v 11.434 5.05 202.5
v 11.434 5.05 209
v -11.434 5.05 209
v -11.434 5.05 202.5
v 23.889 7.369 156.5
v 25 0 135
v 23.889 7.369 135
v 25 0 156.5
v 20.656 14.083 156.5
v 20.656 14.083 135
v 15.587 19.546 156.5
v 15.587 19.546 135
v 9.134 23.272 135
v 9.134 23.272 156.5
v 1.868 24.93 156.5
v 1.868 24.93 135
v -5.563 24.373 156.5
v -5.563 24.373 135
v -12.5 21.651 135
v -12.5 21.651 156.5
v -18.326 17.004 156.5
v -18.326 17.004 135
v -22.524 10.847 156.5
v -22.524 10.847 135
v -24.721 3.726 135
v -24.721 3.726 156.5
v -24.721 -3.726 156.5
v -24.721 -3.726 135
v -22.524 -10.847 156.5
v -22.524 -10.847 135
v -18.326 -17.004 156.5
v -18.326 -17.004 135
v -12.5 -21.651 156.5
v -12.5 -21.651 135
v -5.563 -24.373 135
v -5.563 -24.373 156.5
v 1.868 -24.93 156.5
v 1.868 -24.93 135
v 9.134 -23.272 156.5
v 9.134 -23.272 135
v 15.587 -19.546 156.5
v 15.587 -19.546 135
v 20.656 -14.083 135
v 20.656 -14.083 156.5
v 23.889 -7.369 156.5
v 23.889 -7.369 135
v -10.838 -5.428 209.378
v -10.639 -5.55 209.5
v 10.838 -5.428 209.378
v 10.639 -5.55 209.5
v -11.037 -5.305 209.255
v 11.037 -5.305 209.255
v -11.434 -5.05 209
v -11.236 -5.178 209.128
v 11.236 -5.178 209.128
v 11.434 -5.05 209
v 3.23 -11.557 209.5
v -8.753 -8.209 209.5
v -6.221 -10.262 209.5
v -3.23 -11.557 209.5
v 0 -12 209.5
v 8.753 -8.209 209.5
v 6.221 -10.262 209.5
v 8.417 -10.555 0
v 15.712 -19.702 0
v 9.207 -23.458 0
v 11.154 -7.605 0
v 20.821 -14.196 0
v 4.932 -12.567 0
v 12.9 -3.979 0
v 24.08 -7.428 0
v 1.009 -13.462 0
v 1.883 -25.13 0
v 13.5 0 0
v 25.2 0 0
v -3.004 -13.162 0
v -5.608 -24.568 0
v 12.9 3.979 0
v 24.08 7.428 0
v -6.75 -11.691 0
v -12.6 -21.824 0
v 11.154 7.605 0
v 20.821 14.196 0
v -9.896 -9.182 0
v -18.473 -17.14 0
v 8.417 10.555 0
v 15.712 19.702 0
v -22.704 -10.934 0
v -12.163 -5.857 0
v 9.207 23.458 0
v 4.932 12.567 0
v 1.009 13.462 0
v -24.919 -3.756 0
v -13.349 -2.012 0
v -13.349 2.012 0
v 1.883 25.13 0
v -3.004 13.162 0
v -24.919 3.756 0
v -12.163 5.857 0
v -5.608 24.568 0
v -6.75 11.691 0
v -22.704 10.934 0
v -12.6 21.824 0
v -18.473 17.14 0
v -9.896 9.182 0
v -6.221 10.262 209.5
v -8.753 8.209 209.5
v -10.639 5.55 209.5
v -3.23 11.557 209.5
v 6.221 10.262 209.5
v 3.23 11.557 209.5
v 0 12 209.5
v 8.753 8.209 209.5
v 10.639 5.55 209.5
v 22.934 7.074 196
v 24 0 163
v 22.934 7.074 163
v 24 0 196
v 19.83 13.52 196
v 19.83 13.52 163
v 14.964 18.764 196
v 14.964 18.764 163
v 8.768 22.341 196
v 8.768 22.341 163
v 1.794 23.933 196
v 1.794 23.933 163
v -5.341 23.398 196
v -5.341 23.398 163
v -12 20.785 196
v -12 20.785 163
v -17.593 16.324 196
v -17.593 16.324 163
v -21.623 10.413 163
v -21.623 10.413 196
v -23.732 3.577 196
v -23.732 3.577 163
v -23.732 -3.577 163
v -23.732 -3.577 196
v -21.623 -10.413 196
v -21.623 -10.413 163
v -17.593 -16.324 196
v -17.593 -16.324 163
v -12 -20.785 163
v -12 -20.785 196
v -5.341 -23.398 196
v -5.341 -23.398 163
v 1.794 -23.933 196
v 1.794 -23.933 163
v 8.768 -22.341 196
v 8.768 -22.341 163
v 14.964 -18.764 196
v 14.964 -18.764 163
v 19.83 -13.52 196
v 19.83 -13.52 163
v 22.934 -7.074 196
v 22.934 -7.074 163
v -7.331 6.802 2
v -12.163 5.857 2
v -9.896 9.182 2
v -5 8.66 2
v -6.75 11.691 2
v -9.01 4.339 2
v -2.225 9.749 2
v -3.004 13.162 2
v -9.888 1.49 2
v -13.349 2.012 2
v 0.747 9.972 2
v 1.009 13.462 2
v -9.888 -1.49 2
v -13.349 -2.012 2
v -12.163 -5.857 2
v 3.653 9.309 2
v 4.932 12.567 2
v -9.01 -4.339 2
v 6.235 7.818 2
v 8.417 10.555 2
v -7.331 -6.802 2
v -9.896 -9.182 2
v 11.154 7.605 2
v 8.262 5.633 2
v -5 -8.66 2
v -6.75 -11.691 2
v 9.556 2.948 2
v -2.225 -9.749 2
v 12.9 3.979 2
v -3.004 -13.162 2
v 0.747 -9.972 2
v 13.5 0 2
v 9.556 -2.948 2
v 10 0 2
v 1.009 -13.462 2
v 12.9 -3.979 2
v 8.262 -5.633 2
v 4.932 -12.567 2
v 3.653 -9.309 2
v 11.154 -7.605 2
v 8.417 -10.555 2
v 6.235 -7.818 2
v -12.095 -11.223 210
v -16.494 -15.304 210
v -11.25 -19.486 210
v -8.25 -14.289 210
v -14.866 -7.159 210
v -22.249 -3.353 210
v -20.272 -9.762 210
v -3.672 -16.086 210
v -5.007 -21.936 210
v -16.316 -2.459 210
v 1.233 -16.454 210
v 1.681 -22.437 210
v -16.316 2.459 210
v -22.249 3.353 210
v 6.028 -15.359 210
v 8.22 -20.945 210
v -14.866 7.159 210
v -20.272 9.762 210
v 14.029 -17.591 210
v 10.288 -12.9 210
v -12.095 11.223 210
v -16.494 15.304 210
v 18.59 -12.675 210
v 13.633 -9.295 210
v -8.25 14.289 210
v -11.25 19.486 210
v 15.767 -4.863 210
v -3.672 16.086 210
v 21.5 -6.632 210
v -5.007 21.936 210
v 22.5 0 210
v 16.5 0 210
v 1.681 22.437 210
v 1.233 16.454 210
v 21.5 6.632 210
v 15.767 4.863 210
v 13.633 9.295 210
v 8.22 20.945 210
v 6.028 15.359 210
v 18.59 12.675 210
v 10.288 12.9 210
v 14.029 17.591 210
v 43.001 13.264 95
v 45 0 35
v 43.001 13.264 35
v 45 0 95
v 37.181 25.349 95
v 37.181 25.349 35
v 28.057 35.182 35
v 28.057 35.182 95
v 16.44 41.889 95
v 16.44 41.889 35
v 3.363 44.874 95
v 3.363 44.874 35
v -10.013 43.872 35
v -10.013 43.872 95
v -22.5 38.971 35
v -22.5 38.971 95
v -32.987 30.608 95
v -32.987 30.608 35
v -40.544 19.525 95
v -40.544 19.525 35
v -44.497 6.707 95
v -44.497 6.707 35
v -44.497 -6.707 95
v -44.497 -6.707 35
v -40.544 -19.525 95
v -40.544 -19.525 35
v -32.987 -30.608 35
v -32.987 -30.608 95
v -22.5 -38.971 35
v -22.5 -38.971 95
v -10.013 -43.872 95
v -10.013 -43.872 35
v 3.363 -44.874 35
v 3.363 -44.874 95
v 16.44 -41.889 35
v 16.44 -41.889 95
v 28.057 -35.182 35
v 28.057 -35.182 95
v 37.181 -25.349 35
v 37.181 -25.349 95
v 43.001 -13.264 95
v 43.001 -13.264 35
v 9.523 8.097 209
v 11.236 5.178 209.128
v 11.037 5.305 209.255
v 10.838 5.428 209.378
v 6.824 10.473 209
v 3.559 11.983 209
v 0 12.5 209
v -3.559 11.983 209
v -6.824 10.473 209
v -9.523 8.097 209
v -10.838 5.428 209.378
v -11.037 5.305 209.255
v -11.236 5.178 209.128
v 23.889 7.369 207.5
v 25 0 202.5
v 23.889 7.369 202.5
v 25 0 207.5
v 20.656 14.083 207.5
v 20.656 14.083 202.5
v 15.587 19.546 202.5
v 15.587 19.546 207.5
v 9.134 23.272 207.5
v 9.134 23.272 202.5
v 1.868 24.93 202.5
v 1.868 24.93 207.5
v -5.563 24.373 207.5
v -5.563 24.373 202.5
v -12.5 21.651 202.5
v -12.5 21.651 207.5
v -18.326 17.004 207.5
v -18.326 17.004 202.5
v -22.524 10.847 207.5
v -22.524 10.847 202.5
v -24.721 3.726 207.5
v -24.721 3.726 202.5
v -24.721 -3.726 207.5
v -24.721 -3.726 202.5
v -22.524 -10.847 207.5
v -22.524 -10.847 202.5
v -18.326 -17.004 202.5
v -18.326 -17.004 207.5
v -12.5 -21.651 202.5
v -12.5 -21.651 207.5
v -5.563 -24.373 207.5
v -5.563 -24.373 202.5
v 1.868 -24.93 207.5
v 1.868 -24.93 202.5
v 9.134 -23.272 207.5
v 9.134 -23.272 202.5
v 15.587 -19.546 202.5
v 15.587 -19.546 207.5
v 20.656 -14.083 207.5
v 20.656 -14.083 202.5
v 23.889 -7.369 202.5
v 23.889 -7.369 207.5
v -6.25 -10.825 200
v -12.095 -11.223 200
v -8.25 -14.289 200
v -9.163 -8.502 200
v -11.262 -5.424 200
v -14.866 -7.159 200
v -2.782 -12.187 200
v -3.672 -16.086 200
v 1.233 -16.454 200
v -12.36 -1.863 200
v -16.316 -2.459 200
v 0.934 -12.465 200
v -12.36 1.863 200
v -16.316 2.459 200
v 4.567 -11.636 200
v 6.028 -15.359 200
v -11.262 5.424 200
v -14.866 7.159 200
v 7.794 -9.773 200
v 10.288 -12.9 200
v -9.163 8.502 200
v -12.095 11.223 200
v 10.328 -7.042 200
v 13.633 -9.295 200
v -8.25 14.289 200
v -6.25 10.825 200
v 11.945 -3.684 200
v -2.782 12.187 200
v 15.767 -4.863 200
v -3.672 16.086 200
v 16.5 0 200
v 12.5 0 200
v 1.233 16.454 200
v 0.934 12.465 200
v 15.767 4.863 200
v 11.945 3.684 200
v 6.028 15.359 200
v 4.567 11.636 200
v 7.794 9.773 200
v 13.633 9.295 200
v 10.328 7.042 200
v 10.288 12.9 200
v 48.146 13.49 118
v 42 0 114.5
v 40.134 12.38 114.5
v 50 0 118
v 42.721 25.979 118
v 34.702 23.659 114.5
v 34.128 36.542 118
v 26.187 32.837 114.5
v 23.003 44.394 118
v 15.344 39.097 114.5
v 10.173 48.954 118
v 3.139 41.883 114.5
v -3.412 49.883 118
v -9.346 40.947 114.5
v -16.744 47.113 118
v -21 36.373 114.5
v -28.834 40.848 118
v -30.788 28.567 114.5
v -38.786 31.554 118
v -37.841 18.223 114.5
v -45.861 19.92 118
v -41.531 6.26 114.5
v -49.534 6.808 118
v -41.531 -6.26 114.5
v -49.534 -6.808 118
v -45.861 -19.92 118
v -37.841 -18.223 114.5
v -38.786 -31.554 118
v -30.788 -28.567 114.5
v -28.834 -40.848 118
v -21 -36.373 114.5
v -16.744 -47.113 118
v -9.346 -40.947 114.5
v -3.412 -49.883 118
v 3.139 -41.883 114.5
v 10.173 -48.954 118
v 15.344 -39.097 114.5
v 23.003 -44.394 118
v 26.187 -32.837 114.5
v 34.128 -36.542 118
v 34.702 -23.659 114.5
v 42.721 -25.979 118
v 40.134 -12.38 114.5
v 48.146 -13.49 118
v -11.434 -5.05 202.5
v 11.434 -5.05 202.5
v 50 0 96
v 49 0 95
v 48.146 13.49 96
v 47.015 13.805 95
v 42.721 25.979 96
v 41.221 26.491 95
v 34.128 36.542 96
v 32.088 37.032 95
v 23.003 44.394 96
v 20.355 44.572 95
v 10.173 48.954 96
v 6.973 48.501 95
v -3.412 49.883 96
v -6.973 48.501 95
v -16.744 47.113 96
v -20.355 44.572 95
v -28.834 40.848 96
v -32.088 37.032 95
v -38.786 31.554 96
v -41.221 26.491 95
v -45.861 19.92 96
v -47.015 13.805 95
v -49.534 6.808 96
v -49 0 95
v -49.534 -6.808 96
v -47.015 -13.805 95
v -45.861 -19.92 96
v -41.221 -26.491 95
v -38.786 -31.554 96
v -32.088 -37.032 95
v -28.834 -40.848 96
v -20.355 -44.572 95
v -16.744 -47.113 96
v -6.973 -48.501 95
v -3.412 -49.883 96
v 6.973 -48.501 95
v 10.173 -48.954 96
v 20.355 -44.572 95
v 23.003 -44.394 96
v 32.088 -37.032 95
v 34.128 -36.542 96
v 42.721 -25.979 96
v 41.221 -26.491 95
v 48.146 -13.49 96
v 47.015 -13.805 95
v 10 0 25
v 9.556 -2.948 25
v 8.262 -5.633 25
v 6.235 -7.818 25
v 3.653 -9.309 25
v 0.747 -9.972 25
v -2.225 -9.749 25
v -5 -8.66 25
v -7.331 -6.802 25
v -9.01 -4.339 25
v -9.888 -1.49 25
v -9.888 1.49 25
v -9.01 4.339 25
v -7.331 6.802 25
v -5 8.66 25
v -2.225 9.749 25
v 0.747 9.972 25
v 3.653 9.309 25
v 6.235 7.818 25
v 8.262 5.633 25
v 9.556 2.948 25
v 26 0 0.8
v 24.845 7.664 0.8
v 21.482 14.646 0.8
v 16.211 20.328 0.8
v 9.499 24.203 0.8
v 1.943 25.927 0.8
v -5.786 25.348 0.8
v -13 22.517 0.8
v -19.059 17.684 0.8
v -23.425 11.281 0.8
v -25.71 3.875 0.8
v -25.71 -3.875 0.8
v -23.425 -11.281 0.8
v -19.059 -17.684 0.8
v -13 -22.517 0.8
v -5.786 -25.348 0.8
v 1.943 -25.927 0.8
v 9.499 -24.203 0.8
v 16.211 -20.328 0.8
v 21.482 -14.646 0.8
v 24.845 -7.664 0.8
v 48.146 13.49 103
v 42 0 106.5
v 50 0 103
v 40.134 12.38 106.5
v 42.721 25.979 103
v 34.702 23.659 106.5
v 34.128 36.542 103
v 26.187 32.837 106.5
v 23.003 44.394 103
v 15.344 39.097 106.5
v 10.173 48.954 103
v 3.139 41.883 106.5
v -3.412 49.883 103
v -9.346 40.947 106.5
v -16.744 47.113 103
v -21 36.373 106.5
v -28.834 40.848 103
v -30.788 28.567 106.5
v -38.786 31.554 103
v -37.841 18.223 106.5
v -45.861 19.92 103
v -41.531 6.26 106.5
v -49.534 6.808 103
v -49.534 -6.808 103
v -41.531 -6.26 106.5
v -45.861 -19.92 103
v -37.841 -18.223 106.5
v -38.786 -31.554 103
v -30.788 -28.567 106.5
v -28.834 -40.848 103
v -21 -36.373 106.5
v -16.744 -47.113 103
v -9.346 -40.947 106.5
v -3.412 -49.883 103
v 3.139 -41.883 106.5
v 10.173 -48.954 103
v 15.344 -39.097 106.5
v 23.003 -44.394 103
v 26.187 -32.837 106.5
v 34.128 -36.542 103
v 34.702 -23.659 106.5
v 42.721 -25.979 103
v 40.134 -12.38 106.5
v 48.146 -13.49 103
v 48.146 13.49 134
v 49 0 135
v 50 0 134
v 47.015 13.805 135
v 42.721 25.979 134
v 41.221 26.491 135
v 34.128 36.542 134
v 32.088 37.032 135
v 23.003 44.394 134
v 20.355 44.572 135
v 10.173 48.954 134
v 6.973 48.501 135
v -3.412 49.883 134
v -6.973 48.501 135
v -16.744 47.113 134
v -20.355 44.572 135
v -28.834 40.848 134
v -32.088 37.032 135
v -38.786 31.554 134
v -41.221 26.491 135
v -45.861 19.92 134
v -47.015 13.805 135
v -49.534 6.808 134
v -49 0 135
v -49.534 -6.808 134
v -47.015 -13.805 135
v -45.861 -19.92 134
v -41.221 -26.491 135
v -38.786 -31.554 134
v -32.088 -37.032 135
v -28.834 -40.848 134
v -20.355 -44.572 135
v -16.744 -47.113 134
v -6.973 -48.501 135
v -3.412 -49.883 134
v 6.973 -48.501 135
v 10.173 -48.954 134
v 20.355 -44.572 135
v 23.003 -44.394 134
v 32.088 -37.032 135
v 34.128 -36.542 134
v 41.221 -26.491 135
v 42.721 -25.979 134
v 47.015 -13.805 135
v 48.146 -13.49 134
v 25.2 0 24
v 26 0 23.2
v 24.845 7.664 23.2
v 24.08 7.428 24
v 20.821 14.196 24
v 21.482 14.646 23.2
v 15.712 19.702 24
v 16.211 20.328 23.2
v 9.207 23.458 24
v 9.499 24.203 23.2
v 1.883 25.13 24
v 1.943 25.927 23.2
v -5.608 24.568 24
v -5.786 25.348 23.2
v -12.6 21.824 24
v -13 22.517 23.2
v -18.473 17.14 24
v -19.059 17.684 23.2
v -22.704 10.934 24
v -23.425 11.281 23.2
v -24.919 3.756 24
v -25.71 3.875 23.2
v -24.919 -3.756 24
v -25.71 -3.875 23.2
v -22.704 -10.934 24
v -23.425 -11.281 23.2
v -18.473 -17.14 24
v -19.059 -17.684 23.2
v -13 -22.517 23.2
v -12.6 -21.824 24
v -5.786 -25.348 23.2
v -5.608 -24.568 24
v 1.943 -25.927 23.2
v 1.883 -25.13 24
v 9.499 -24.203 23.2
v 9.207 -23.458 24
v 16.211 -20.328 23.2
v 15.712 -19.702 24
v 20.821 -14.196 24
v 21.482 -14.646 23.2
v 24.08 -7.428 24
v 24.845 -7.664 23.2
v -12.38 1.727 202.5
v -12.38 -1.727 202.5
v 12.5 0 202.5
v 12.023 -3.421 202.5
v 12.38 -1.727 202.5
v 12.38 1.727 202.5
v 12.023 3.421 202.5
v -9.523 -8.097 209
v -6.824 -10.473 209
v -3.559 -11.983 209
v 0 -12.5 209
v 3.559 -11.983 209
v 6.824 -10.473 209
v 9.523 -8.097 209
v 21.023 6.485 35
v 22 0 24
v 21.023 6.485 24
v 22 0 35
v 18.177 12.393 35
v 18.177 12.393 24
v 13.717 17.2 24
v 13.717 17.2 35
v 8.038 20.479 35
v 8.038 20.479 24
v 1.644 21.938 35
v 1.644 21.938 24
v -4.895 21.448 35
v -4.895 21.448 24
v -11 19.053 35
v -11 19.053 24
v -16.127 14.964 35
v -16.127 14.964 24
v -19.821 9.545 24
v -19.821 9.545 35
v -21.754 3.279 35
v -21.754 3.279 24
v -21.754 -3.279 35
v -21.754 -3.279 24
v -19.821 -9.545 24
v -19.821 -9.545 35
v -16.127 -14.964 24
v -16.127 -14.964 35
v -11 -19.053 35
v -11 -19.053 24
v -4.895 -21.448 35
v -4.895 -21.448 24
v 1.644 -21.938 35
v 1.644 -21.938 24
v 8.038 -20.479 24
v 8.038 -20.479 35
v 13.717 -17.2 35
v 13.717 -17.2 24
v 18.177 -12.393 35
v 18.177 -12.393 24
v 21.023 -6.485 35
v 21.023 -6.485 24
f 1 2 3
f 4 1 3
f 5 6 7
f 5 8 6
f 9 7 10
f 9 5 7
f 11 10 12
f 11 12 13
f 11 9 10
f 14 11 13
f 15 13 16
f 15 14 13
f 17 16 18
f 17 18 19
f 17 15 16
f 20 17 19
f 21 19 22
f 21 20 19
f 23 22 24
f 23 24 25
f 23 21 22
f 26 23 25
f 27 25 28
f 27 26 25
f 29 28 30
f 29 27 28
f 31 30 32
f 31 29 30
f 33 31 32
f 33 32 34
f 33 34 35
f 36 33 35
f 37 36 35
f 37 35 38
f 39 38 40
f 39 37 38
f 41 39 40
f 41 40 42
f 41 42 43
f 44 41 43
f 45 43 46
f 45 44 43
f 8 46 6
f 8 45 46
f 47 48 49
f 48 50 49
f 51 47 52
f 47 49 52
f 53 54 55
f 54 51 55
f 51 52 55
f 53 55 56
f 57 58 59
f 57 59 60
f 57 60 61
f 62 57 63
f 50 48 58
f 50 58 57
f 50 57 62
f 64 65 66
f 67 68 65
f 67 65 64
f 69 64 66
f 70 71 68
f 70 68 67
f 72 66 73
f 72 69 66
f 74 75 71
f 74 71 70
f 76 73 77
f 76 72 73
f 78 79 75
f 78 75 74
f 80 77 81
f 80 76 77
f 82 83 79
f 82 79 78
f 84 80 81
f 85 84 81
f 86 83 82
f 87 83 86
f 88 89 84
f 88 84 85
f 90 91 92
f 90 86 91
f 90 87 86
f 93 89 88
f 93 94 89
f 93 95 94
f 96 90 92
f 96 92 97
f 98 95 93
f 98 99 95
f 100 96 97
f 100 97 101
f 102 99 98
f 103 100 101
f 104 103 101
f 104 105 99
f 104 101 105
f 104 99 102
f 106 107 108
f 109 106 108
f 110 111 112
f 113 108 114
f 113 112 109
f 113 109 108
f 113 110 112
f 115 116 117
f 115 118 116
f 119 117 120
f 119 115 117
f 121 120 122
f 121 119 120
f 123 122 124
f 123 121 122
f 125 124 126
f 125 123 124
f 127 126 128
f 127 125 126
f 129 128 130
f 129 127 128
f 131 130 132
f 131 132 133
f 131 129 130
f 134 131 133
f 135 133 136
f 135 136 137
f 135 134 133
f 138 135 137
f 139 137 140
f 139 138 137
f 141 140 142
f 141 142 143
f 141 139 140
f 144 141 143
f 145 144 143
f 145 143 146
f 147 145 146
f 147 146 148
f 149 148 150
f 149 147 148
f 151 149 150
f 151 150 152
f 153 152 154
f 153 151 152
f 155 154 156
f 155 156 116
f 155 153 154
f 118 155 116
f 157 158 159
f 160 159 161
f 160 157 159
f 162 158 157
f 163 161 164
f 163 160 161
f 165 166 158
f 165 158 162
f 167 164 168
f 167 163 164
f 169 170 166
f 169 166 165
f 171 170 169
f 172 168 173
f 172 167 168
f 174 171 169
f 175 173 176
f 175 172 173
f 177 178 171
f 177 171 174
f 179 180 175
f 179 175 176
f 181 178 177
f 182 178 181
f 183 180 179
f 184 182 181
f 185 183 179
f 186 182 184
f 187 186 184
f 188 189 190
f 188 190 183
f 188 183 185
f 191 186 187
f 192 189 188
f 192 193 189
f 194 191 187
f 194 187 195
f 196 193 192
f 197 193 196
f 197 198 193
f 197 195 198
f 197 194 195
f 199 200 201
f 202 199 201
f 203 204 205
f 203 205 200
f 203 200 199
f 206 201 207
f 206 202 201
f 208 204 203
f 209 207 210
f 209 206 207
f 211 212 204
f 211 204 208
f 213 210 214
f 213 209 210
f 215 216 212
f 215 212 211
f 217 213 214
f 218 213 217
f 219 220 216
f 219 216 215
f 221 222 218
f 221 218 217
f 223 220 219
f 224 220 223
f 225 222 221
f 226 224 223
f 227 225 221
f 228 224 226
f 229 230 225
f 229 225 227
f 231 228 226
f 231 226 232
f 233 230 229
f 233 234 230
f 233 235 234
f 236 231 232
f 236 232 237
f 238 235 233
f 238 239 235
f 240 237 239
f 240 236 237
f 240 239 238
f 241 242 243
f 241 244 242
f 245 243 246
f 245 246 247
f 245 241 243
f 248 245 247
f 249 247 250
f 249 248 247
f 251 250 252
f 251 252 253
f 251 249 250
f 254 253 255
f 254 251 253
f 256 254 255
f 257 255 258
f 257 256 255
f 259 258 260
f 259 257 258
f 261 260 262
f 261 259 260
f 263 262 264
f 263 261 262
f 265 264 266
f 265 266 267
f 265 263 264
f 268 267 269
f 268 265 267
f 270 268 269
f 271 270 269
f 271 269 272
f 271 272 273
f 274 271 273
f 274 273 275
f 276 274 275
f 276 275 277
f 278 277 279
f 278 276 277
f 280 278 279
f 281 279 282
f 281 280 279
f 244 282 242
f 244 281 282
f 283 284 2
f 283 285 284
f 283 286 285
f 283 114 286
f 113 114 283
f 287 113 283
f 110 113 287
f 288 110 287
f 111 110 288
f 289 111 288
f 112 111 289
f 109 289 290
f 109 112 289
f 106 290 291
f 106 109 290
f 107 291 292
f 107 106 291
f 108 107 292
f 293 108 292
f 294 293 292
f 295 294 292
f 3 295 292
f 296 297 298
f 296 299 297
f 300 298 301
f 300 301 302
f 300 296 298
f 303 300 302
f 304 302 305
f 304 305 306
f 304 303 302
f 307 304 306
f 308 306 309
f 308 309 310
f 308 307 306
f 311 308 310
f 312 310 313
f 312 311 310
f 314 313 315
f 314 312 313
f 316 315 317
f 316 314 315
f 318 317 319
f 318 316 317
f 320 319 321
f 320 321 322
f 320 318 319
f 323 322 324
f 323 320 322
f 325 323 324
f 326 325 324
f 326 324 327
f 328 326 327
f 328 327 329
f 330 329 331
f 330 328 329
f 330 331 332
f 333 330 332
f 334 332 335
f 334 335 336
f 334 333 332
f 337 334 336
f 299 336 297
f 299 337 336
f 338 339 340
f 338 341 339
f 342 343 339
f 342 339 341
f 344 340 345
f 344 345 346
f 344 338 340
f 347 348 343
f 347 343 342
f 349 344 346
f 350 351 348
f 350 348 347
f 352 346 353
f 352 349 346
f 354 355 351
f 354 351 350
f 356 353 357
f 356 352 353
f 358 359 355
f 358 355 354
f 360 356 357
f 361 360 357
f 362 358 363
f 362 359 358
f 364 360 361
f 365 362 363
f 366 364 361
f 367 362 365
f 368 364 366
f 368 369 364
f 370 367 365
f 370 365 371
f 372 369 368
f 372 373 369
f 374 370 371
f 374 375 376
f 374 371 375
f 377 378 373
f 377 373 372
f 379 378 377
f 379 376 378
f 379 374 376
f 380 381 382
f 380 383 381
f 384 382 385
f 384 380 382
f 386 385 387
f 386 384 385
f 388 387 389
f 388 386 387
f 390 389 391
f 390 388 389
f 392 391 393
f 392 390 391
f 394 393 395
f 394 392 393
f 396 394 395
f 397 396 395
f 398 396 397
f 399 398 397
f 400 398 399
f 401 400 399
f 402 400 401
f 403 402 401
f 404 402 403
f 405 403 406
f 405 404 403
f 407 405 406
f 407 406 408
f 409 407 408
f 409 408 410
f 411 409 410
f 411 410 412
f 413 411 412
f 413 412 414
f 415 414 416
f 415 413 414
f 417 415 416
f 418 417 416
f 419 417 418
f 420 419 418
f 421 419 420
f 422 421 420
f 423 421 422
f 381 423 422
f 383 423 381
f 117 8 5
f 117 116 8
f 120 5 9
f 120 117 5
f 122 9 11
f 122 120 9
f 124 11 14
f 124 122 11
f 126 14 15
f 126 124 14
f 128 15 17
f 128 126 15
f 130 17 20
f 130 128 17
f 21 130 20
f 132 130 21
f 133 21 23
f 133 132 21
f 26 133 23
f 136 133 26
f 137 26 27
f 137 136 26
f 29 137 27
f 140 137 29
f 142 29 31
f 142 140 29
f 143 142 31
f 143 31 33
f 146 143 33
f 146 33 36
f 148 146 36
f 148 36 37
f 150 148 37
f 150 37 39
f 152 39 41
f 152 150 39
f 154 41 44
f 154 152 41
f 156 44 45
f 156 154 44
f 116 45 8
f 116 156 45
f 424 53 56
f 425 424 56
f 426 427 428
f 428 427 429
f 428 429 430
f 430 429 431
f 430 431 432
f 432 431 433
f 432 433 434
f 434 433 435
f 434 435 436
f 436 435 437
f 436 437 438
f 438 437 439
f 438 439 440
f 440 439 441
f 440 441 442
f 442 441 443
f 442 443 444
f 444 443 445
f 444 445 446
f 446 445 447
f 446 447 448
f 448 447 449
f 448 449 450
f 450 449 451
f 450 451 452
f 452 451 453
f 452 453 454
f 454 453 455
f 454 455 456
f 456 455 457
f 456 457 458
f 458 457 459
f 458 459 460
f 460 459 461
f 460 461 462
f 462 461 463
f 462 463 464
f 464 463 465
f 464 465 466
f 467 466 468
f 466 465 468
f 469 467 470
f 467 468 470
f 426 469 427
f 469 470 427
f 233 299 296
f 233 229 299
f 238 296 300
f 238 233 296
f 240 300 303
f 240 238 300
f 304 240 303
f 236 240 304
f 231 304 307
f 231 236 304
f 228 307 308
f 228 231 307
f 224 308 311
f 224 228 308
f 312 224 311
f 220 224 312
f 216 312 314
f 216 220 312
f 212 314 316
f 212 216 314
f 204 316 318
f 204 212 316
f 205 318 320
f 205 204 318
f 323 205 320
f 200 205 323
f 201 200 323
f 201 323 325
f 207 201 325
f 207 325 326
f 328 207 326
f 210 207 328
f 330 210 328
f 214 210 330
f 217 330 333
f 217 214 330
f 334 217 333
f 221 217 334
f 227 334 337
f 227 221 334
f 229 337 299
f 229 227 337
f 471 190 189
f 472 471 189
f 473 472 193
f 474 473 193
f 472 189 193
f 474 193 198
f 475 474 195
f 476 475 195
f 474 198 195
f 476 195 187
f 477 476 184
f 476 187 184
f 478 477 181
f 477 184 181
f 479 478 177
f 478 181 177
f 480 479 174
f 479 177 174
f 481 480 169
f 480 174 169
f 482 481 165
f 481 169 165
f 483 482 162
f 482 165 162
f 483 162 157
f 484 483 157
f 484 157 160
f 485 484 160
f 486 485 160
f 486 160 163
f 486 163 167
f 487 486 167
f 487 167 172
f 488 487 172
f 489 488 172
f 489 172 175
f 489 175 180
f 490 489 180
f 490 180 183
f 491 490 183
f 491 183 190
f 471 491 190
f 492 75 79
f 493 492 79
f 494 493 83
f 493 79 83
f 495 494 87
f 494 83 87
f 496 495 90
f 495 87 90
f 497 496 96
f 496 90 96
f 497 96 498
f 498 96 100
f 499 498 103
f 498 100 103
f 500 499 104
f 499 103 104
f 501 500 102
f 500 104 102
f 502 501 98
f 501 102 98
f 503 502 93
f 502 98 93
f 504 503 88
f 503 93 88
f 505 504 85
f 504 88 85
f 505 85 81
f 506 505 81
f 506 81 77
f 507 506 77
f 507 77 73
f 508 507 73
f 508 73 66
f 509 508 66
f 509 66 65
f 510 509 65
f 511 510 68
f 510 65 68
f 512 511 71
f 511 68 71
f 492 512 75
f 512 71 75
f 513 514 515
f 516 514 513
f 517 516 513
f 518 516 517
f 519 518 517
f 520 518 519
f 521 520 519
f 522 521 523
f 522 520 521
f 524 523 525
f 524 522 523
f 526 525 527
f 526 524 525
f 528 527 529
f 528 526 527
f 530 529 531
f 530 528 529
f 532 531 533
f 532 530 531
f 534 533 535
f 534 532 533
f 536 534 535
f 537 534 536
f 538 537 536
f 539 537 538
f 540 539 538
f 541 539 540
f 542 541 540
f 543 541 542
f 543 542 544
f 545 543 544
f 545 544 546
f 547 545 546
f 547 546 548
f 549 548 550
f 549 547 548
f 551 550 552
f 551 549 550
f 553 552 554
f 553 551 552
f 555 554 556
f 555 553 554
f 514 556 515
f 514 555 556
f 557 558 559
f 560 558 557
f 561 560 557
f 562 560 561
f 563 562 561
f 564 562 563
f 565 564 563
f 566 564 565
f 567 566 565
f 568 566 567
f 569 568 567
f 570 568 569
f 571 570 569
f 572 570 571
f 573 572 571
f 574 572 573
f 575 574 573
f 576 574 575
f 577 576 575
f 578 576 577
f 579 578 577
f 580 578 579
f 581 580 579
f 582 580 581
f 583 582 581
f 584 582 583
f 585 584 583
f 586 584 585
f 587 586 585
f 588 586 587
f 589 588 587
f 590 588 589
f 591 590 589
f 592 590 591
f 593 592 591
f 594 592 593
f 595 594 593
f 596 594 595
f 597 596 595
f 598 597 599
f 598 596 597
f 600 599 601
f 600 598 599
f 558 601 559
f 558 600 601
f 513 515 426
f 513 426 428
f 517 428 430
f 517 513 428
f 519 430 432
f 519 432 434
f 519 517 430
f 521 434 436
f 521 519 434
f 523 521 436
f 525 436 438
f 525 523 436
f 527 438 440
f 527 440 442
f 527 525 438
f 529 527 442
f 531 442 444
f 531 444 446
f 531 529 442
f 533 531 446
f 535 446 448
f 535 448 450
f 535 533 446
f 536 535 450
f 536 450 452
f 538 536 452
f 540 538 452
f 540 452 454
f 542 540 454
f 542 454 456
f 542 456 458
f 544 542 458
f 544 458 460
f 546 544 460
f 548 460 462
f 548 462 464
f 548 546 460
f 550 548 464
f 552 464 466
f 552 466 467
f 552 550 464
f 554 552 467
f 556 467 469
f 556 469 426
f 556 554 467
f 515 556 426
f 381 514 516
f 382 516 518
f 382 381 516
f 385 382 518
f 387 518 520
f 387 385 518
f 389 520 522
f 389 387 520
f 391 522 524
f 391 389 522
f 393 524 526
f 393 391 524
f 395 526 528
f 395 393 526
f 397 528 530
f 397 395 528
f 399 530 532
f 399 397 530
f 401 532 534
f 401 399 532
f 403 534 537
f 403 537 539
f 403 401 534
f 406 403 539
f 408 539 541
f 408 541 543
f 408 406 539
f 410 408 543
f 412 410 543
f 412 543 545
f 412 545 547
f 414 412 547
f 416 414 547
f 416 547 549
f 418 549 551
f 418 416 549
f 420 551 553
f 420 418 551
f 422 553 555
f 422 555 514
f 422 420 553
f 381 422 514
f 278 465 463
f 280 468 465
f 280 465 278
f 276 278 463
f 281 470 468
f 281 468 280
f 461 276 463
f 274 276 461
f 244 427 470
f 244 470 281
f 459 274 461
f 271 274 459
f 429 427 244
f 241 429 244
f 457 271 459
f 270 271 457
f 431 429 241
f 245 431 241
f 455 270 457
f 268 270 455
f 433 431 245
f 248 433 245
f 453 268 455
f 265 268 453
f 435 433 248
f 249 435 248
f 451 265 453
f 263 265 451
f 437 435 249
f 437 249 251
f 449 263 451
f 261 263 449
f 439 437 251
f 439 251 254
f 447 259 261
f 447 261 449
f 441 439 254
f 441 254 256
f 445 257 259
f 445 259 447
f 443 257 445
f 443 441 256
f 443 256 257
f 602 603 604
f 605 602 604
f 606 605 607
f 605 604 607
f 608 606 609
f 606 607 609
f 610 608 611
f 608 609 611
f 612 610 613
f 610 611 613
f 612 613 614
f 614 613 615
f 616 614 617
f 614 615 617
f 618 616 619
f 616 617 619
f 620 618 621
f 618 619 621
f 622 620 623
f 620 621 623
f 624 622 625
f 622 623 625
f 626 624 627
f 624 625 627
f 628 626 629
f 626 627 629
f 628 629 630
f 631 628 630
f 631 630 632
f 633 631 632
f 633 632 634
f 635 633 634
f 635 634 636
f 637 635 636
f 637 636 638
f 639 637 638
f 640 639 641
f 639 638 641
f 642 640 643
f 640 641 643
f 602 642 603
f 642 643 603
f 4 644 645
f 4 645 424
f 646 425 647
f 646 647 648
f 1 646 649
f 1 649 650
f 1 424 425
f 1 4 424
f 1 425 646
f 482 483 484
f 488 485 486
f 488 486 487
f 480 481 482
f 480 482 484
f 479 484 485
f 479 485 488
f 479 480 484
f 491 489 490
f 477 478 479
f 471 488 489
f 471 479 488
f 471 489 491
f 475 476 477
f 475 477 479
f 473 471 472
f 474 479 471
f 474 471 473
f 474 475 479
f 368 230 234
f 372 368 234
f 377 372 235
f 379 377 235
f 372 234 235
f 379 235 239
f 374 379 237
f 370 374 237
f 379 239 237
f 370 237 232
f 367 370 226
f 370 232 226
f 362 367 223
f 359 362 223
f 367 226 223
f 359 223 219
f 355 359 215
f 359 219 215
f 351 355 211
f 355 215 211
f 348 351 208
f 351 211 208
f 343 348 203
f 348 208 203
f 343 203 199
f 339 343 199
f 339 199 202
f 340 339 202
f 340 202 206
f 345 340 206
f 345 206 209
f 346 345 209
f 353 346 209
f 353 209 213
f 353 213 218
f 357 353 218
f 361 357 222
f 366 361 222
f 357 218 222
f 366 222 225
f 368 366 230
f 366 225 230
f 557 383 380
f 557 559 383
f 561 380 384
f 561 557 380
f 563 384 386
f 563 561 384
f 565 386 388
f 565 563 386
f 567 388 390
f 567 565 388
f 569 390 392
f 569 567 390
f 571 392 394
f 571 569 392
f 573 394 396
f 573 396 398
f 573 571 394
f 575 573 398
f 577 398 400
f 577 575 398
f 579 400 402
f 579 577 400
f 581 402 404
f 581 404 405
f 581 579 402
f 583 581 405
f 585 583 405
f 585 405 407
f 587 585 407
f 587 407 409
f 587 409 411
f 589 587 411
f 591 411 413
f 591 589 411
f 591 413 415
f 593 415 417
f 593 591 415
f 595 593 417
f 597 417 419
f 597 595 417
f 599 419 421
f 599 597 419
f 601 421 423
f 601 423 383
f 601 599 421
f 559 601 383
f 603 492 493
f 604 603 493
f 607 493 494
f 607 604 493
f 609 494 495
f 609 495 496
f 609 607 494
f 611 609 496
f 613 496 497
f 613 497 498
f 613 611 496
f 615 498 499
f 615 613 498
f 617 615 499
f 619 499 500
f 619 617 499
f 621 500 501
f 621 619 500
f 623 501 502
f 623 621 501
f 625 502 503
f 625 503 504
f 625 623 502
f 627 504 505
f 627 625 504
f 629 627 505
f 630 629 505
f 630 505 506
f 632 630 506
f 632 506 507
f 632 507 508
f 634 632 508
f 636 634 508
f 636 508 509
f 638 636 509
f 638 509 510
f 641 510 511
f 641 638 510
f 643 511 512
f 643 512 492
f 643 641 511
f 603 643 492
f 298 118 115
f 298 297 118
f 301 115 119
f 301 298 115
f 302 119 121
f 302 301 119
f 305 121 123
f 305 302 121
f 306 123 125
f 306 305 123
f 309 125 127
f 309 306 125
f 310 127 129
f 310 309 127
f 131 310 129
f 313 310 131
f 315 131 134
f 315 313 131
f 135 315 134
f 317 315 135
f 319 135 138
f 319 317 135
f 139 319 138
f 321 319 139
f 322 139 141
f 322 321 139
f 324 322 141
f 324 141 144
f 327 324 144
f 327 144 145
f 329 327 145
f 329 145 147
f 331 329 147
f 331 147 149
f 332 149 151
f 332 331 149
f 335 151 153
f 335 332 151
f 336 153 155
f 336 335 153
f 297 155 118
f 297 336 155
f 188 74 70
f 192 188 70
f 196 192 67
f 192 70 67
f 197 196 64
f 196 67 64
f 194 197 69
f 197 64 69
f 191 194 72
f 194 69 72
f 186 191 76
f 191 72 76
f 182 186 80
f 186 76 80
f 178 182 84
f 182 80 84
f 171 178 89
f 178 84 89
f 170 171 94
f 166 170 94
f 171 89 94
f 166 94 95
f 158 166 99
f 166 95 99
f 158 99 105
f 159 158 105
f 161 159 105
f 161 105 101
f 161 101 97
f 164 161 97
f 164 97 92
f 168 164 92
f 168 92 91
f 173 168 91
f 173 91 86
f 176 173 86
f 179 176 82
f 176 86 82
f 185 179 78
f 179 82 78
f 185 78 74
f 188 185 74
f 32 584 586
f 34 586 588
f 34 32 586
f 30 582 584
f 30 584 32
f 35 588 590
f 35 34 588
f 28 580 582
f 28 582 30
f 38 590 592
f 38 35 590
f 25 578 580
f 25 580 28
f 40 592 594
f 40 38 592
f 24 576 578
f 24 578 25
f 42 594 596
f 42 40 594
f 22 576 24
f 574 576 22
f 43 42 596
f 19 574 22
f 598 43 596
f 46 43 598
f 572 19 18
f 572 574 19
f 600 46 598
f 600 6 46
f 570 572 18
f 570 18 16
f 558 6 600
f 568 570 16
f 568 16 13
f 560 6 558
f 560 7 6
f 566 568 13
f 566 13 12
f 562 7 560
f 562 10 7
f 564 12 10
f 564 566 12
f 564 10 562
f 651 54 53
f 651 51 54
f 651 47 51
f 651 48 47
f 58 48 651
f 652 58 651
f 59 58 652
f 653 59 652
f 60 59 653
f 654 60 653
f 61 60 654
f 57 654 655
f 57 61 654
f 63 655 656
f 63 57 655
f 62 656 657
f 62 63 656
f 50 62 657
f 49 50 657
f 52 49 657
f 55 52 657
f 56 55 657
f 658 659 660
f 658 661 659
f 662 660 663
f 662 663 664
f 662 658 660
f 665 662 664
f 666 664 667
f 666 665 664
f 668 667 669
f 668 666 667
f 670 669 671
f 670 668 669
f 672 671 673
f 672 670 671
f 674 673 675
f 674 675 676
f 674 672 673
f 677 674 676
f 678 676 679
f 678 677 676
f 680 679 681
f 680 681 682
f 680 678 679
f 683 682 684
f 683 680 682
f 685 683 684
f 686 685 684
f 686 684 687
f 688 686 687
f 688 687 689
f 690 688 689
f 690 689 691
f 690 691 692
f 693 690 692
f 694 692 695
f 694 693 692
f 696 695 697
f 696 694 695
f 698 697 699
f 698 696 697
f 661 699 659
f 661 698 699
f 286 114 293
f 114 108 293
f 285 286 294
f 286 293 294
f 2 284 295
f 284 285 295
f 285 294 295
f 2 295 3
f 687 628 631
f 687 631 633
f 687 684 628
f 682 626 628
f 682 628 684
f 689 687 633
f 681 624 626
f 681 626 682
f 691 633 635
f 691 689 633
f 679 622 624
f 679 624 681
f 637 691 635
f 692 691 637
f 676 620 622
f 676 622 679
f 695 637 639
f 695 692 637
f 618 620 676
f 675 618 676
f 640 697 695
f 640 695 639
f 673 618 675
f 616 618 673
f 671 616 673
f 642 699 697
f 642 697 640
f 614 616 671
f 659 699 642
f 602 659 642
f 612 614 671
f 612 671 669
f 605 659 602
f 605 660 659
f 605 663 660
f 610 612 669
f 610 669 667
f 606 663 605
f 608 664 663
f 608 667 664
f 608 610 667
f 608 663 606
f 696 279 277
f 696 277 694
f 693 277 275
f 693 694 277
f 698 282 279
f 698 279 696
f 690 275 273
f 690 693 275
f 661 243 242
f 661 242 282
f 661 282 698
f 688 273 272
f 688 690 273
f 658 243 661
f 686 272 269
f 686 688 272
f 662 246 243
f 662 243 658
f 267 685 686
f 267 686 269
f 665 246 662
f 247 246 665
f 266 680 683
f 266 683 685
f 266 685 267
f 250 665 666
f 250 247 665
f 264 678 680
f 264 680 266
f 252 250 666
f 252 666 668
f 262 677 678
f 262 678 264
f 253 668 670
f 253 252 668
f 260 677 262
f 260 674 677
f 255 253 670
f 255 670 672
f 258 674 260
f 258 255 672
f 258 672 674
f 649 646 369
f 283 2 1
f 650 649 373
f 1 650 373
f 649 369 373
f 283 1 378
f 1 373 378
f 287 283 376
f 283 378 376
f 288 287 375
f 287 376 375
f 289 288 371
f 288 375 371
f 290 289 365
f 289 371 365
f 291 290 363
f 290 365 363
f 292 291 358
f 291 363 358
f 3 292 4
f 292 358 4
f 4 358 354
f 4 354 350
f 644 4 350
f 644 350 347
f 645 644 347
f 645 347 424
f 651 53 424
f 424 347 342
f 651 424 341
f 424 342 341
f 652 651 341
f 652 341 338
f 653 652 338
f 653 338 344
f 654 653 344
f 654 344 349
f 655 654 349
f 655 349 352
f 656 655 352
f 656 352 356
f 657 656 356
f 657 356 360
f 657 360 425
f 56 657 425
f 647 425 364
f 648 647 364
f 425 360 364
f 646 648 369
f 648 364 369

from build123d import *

# Parameters (mm, degrees)
F2_R      = 13.5
F2_R_2    = 10
F3_DEPTH  = 2
F4_DEPTH  = 25
F5_R      = 16.5
F6_DEPTH  = 10
F7_R      = 12.5
F8_DEPTH  = 9.5
F10_DEPTH = 7
F11_SIZE  = 0.5
F12_SIZE  = 1
F13_SIZE  = 0.8


with BuildPart() as f1:
    # F0 (on Front) → F1 (revolve)
    with BuildSketch(Plane.XZ):
        Polygon((0, 210), (0, 0), (26, 0), (26, 24), (22, 24), (22, 35), (45, 35), (45, 95), (50, 95), (50, 103), (42, 106.5), (42, 114.5), (50, 118), (50, 134), (49, 135), (25, 135), (25, 156.5), (24, 163), (24, 196), (25, 202.5), (25, 207.5), (22.5, 210), align=None)
    revolve(axis=Axis((0, 0, 105), (0, 0, 1)))

    # F2 (on face) → F3 (cut)
    with BuildSketch(Plane(origin=(0, 0, 0), x_dir=(1, 0, 0), z_dir=(0, 0, -1))):
        Circle(F2_R)
        Circle(F2_R_2, mode=Mode.SUBTRACT)
    extrude(amount=-F3_DEPTH, mode=Mode.SUBTRACT)

    # F2 (on face) → F4 (cut)
    with BuildSketch(Plane(origin=(0, 0, 0), x_dir=(1, 0, 0), z_dir=(0, 0, -1))):
        Circle(F2_R_2)
    extrude(amount=-F4_DEPTH, mode=Mode.SUBTRACT)

    # F5 (on face) → F6 (cut)
    with BuildSketch(Plane.XY.offset(210)):
        Circle(F5_R)
    extrude(amount=-F6_DEPTH, mode=Mode.SUBTRACT)

    # F7 (on face) → F8 (join)
    with BuildSketch(Plane.XY.offset(200)):
        Circle(F7_R)
    extrude(amount=F8_DEPTH)

    # F9 (on face) → F10 (cut)
    with BuildSketch(Plane.XY.offset(209.5)):
        with BuildLine():
            ThreePointArc((12.5, 0), (12.2307213882, 2.5805918554), (11.4344873081, 5.05))
            Line((11.4344873081, 5.05), (-11.4344873081, 5.05))
            ThreePointArc((-11.4344873081, 5.05), (-12.5, 0), (-11.4344873081, -5.05))
            Line((-11.4344873081, -5.05), (11.4344873081, -5.05))
            ThreePointArc((11.4344873081, -5.05), (12.2307213882, -2.5805918554), (12.5, 0))
        make_face()
    extrude(amount=-F10_DEPTH, mode=Mode.SUBTRACT)

    # F11
    f11_edges = [f1.edges().sort_by_distance(p)[0] for p in [
        (0, 5.05, 209.5),
        (0, 12.5, 209.5),
        (0, -12.5, 209.5),
        (0, -5.05, 209.5),
    ]]
    chamfer(f11_edges, length=F11_SIZE)

    # F12
    f12_edges = [f1.edges().sort_by_distance(p)[0] for p in [
        (-50, 0, 95),
    ]]
    chamfer(f12_edges, length=F12_SIZE)

    # F13
    f13_edges = [f1.edges().sort_by_distance(p)[0] for p in [
        (-26, 0, 24),
        (-26, 0, 0),
    ]]
    chamfer(f13_edges, length=F13_SIZE)


solid = f1.part
